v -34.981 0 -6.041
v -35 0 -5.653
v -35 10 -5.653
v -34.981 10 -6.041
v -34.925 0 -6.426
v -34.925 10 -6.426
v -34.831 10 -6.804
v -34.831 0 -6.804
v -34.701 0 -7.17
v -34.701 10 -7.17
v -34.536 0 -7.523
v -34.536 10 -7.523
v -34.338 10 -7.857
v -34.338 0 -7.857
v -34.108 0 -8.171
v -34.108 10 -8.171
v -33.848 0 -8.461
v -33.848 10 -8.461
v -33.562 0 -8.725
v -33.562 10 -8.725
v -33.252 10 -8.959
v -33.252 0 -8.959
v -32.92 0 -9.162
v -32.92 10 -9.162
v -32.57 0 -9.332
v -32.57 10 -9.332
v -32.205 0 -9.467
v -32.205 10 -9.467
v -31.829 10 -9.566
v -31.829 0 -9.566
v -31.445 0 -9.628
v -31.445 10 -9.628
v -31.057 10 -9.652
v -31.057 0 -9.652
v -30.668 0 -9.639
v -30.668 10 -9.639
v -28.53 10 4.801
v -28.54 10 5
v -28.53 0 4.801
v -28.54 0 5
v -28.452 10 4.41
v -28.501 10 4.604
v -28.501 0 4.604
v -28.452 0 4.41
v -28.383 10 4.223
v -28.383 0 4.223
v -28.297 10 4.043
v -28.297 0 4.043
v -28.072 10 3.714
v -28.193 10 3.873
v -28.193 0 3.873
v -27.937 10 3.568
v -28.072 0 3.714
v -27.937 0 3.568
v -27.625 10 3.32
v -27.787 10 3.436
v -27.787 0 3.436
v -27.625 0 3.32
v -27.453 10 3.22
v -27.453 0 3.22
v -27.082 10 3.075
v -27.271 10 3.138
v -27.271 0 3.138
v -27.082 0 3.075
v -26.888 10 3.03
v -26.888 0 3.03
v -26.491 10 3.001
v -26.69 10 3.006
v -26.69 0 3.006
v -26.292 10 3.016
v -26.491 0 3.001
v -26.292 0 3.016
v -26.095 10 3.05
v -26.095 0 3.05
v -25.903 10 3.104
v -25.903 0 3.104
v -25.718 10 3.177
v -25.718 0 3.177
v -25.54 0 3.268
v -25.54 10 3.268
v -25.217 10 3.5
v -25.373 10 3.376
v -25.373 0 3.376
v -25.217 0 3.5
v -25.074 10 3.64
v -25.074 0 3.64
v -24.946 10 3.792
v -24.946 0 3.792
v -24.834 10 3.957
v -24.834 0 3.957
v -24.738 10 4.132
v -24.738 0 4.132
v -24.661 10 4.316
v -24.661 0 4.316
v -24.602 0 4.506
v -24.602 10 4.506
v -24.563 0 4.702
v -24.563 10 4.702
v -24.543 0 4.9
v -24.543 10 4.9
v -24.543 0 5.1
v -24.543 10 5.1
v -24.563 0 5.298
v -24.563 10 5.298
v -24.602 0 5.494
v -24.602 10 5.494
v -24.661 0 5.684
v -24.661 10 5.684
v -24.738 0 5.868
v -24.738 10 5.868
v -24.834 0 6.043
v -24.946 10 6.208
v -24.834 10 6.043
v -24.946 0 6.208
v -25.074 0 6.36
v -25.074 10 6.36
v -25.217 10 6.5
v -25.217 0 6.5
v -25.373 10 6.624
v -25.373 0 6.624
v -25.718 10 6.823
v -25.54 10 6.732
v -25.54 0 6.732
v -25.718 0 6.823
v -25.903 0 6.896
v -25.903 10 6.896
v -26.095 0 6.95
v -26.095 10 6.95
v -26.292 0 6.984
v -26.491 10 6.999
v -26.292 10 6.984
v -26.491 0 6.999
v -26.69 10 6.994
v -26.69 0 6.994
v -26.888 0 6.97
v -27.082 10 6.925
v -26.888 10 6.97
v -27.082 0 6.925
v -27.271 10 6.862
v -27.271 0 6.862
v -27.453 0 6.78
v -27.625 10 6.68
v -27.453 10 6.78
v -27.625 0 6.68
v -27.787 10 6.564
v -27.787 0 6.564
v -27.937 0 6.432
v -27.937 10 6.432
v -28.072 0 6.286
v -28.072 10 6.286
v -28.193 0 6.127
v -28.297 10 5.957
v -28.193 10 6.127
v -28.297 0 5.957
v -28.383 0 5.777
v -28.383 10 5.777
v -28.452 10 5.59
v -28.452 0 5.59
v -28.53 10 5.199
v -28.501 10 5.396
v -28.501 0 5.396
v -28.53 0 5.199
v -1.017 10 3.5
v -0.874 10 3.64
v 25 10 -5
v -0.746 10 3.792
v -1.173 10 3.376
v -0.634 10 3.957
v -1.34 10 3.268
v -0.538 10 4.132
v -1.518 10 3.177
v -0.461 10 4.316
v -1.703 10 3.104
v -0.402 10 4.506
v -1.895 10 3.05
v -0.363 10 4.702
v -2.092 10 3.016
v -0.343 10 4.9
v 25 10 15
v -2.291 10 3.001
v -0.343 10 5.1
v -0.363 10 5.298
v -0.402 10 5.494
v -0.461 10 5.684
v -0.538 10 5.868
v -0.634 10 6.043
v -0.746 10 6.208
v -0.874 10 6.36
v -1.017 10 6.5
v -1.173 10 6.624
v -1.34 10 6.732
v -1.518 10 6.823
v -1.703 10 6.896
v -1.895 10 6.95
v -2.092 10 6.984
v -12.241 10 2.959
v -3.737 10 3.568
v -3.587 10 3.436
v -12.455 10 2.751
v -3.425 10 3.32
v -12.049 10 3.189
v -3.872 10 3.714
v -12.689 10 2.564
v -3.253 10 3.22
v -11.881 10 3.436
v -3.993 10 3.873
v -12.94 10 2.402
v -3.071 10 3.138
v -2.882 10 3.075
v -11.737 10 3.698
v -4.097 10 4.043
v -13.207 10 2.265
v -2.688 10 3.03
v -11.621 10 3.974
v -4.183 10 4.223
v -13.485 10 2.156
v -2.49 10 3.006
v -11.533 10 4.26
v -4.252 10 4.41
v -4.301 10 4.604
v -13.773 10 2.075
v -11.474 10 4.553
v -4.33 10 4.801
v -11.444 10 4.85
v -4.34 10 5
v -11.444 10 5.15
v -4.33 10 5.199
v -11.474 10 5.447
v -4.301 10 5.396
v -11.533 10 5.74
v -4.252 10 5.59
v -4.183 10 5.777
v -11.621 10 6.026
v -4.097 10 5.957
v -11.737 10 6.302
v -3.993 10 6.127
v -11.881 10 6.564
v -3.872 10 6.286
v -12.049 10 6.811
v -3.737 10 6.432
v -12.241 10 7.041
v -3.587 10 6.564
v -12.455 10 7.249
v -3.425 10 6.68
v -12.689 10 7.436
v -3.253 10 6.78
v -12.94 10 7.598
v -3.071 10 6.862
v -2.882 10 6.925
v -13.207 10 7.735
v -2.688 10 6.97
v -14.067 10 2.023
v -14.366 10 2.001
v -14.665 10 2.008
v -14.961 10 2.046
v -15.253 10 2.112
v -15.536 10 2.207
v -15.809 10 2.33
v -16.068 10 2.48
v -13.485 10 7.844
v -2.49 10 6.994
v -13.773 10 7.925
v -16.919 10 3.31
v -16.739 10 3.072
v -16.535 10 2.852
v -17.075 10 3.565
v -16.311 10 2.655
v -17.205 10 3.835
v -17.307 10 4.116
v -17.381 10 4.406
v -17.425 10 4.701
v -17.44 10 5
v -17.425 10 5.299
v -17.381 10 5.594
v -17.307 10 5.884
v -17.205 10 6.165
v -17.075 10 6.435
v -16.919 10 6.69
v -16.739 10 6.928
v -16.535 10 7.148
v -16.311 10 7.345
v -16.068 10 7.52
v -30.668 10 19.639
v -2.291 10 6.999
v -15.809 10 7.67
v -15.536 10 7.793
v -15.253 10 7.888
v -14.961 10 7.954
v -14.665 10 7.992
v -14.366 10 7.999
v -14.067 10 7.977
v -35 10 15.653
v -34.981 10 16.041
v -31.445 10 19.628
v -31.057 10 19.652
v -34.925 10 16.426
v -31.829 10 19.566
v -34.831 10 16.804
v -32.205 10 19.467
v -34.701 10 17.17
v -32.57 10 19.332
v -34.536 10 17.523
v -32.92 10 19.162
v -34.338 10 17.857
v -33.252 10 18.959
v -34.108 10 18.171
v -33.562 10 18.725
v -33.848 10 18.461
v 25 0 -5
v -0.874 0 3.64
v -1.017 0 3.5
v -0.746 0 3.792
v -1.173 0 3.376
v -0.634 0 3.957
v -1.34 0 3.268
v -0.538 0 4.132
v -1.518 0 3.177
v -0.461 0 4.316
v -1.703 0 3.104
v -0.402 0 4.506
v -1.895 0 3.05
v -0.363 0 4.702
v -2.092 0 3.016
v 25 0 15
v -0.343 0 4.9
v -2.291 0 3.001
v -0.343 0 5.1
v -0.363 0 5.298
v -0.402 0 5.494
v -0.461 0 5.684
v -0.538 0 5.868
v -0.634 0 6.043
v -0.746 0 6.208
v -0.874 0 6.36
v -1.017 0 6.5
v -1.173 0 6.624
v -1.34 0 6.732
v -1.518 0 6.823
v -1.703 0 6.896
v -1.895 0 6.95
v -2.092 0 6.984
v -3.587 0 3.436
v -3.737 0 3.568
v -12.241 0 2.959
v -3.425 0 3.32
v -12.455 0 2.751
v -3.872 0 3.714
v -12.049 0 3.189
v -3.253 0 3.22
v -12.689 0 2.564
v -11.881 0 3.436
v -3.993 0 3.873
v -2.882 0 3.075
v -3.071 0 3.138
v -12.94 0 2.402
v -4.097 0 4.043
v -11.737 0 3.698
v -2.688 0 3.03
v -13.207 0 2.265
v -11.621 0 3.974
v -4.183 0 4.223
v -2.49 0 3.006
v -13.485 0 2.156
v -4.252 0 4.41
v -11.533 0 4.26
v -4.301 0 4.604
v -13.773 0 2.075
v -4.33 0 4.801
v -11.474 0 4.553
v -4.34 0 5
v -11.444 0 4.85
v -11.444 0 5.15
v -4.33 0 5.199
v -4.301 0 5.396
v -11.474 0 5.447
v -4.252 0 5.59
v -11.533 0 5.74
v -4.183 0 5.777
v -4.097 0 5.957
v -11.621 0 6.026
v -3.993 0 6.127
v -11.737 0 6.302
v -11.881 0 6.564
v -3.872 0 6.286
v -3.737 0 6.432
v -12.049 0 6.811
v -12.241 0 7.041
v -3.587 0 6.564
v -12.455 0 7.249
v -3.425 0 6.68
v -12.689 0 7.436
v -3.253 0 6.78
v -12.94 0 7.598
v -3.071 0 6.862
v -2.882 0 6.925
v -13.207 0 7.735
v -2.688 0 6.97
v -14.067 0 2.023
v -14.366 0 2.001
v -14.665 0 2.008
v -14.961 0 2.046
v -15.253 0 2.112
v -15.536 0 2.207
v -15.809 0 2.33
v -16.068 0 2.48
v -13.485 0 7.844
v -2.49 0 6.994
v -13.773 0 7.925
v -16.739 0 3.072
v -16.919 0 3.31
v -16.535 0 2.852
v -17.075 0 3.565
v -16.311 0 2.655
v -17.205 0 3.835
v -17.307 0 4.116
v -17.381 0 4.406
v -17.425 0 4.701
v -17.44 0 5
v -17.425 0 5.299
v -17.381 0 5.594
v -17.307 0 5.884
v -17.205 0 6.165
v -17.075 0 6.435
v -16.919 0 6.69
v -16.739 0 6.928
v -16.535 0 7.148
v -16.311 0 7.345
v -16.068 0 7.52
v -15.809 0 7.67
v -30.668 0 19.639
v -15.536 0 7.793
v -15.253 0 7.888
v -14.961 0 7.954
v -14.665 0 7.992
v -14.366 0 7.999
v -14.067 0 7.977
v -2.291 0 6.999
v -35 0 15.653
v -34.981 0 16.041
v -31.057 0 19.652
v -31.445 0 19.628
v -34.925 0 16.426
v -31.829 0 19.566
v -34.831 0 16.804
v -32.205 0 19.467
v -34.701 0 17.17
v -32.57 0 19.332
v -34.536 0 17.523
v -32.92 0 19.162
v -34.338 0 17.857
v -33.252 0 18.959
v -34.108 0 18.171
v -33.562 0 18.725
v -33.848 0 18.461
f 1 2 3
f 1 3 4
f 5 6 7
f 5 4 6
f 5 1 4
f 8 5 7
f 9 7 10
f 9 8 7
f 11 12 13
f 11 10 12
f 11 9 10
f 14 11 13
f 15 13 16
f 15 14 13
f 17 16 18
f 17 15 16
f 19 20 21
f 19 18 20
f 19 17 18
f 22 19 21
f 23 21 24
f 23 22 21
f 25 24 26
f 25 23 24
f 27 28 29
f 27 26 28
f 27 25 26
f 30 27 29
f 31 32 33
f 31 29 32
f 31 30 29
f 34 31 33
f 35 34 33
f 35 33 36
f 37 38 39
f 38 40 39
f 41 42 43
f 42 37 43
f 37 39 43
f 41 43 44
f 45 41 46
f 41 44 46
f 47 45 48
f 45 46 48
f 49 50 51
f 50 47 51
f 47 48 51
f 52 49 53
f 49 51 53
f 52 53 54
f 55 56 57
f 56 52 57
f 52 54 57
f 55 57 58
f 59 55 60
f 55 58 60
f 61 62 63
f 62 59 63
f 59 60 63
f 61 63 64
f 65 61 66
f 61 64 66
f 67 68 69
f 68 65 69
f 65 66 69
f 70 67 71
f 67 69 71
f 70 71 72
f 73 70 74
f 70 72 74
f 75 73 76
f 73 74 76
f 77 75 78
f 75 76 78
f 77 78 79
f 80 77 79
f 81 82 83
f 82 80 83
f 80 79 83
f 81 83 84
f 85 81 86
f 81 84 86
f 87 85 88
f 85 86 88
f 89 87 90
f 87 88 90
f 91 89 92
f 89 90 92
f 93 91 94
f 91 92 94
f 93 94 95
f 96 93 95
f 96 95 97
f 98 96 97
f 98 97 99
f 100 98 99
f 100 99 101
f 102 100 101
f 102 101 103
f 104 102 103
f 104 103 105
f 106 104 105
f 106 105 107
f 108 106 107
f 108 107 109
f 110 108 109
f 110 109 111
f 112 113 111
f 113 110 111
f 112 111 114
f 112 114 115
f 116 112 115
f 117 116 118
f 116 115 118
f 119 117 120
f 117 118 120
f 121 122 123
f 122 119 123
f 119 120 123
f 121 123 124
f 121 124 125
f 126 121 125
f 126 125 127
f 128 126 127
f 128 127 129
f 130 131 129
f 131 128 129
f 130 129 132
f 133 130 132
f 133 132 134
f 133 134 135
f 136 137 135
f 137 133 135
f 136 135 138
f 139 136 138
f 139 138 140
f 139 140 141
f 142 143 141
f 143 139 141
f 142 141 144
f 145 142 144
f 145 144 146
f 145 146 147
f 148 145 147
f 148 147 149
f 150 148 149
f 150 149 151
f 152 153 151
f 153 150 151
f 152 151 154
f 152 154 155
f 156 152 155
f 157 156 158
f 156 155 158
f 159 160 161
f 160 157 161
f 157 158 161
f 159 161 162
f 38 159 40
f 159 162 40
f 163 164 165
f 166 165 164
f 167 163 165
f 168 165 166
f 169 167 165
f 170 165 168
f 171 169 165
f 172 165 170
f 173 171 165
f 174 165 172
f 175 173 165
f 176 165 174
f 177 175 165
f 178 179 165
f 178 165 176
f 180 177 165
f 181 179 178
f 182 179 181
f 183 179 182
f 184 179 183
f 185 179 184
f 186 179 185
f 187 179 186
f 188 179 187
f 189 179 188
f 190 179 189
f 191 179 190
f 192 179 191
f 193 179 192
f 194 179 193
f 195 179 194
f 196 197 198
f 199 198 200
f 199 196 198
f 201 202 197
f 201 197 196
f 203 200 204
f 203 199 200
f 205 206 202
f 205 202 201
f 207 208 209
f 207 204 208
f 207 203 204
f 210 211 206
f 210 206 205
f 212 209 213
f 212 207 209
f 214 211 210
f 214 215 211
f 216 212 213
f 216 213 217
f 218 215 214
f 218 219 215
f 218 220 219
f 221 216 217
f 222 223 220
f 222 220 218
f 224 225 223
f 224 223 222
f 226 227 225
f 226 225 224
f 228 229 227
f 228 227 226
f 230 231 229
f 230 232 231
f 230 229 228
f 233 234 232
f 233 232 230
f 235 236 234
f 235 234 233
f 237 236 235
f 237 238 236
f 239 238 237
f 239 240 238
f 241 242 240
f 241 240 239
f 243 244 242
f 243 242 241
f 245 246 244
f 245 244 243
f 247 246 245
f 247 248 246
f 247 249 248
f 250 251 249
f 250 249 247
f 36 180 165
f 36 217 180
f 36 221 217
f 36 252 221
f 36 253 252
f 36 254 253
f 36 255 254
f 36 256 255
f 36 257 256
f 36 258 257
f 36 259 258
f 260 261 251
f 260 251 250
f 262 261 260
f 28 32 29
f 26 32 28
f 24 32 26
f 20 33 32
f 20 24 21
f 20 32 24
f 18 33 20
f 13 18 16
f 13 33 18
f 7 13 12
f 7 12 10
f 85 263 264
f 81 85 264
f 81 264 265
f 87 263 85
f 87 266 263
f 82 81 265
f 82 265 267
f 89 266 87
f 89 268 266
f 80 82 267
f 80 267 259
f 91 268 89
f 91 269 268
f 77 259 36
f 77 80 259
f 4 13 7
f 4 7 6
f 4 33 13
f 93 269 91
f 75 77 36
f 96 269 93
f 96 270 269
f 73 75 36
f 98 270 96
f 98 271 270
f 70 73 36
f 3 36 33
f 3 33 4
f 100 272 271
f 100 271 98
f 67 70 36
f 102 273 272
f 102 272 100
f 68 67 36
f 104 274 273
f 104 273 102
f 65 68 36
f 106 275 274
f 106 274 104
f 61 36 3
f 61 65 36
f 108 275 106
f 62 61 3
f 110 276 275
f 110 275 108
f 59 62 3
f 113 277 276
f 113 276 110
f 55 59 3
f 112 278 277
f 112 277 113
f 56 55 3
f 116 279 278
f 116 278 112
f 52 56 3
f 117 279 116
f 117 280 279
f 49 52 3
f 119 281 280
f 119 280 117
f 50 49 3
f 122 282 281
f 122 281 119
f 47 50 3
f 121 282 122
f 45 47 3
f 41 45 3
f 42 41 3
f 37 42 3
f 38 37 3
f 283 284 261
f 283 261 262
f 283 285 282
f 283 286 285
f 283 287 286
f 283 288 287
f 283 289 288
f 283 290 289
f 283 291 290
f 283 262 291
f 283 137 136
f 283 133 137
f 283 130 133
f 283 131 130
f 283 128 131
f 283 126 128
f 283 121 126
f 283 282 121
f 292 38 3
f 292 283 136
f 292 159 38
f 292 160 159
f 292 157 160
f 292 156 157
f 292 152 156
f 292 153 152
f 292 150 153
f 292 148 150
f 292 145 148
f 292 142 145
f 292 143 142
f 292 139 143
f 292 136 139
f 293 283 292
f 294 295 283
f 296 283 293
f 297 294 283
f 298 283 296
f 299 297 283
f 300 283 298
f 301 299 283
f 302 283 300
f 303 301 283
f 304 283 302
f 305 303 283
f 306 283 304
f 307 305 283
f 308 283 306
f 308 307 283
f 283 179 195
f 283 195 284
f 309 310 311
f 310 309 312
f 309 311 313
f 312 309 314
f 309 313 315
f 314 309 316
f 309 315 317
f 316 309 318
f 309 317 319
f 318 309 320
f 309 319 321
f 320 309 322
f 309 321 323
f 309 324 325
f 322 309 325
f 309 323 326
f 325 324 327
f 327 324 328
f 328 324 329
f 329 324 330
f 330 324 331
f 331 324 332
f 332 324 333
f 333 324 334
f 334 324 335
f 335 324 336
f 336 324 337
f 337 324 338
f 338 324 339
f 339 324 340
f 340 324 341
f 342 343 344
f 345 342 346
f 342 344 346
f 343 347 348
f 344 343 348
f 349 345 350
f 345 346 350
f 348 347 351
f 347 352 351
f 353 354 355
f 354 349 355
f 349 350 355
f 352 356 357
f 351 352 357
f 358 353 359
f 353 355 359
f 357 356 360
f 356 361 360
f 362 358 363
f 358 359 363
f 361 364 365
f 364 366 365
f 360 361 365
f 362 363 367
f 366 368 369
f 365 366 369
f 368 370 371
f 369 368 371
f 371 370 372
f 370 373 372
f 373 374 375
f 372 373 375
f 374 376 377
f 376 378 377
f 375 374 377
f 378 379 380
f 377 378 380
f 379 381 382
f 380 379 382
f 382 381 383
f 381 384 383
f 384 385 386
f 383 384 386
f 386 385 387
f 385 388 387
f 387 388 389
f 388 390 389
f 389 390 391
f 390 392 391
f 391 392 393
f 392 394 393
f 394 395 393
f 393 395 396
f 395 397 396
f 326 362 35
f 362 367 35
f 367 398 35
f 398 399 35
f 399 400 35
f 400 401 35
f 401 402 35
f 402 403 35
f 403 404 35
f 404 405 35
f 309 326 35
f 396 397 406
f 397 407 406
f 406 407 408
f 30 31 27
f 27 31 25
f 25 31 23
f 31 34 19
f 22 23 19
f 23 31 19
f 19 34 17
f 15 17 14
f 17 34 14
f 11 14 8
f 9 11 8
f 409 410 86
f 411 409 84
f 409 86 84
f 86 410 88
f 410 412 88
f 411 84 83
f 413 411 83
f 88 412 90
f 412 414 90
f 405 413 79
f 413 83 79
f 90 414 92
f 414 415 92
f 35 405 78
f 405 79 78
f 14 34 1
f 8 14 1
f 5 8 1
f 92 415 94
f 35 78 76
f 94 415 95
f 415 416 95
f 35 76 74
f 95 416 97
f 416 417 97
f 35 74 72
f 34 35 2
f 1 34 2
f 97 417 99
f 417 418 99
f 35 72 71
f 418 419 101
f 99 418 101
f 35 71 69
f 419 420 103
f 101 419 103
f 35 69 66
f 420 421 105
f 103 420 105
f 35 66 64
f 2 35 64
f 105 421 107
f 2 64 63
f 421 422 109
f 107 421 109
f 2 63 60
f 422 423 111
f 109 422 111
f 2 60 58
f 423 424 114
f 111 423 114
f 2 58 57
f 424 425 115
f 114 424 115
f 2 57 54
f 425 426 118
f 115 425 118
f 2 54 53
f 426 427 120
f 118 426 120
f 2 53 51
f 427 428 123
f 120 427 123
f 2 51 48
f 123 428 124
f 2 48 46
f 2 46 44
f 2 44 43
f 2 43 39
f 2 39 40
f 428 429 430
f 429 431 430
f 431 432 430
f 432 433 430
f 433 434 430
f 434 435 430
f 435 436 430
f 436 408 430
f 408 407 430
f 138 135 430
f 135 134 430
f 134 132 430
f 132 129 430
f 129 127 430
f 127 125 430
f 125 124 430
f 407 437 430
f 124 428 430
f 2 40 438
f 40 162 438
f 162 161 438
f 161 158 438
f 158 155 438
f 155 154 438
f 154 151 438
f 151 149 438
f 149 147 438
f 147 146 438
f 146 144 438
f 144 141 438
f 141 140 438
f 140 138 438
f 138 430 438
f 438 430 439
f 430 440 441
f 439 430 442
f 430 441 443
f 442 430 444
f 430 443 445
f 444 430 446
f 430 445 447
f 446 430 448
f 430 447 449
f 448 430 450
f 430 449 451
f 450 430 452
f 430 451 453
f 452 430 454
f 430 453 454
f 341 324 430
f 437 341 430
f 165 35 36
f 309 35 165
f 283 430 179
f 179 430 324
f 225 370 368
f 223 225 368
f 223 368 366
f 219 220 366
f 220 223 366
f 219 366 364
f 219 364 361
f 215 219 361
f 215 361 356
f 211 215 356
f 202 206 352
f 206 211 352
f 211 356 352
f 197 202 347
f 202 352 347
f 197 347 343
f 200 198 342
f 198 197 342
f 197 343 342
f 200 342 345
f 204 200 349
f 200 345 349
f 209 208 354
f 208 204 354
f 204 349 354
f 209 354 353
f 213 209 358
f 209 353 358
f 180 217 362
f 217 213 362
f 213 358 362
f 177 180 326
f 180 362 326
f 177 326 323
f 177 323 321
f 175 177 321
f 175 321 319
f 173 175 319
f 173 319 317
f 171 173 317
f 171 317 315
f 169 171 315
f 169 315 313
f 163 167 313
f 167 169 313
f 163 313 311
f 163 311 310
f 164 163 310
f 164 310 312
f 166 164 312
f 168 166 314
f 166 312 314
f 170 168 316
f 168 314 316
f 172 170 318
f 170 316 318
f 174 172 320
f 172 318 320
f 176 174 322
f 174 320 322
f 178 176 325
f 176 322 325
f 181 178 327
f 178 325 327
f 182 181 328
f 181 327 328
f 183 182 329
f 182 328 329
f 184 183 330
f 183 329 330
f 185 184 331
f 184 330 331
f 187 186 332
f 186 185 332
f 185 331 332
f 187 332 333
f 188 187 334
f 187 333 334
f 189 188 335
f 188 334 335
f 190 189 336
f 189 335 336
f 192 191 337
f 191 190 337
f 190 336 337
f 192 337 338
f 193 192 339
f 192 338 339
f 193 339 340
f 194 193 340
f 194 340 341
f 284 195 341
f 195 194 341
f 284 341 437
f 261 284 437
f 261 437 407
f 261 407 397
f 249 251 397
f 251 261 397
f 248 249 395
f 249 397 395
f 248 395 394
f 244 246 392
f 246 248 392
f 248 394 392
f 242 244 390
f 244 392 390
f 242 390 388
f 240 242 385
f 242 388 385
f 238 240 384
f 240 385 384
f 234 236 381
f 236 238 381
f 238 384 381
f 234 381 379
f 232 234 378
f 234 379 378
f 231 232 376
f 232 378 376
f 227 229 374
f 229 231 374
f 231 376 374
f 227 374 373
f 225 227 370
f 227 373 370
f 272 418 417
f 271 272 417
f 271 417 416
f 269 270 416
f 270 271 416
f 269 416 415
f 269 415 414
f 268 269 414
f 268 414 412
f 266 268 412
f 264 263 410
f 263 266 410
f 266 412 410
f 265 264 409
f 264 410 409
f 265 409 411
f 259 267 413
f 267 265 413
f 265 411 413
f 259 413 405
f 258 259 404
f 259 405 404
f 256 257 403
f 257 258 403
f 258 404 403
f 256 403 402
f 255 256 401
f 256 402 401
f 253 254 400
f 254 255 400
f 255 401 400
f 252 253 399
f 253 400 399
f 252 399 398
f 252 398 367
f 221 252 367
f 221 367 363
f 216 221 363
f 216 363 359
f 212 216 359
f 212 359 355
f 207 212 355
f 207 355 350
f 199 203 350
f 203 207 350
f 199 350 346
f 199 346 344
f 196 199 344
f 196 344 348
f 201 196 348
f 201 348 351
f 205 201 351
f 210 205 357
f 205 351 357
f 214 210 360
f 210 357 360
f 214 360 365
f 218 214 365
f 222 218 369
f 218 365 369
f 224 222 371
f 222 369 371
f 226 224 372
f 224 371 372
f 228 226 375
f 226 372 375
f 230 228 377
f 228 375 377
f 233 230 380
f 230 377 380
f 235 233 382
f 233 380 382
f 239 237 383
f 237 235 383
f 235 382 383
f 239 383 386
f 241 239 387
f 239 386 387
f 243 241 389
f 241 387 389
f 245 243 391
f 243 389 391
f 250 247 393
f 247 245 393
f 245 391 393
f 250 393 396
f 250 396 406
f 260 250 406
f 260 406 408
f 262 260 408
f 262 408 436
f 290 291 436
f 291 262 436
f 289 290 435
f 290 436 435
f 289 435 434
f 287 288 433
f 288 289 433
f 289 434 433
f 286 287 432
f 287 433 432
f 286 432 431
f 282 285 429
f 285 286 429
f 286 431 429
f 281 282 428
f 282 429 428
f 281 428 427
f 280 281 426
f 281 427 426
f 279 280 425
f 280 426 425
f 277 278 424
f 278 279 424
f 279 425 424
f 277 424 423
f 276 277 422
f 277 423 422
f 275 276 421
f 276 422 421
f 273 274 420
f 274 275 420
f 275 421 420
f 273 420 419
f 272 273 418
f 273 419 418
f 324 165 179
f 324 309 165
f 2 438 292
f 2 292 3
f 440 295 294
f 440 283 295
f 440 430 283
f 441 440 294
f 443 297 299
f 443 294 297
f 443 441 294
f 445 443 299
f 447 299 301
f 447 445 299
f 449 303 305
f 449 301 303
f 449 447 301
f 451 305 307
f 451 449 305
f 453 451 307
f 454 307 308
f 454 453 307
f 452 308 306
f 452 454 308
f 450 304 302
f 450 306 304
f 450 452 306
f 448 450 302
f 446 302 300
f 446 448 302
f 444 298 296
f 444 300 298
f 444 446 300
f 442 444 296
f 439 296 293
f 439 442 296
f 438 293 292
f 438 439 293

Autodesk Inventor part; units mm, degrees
ref_plane "YZ Plane" through (0, 0, 0) normal (1, 0, 0) x (0, 1, 0)
ref_plane "XZ Plane" through (0, 0, 0) normal (0, 1, 0) x (-1, 0, 0)
ref_plane "XY Plane" through (0, 0, 0) normal (0, 0, 1) x (1, 0, 0)
sketch "Эскиз1" plane through (0, 0, 0) normal (0, 1, 0) x (-1, 0, 0)
  line L0 (35, 15.6528) -> (35, -5.6528)
  line L1 (-25, -5) -> (-25, 15)
  line L2 (30.6678, 19.639) -> (-25, 15)
  line L3 (30.6678, -9.639) -> (-25, -5)
  circle A0 centre (2.3404, 5) radius 2
  circle A1 centre (14.4404, 5) radius 3
  circle A2 centre (26.5404, 5) radius 2
  arc A3 (35, 15.6528) -> (30.6678, 19.639) centre (31, 15.6528) ccw
  arc A4 (30.6678, -9.639) -> (35, -5.6528) centre (31, -5.6528) ccw
  point P0 (0, 0)
  point P1 (35, -10)
  point P2 (35, 20)
  point P3 (12.9676, -25.8489)
  dimension "d0" = 30
  dimension "d4" = 60
  dimension "d6" = 15
  dimension "d8" = 4
extrude "Выдавливание1" add sketch "Эскиз1" along normal blind 10
properties part number "хуйня резня"
